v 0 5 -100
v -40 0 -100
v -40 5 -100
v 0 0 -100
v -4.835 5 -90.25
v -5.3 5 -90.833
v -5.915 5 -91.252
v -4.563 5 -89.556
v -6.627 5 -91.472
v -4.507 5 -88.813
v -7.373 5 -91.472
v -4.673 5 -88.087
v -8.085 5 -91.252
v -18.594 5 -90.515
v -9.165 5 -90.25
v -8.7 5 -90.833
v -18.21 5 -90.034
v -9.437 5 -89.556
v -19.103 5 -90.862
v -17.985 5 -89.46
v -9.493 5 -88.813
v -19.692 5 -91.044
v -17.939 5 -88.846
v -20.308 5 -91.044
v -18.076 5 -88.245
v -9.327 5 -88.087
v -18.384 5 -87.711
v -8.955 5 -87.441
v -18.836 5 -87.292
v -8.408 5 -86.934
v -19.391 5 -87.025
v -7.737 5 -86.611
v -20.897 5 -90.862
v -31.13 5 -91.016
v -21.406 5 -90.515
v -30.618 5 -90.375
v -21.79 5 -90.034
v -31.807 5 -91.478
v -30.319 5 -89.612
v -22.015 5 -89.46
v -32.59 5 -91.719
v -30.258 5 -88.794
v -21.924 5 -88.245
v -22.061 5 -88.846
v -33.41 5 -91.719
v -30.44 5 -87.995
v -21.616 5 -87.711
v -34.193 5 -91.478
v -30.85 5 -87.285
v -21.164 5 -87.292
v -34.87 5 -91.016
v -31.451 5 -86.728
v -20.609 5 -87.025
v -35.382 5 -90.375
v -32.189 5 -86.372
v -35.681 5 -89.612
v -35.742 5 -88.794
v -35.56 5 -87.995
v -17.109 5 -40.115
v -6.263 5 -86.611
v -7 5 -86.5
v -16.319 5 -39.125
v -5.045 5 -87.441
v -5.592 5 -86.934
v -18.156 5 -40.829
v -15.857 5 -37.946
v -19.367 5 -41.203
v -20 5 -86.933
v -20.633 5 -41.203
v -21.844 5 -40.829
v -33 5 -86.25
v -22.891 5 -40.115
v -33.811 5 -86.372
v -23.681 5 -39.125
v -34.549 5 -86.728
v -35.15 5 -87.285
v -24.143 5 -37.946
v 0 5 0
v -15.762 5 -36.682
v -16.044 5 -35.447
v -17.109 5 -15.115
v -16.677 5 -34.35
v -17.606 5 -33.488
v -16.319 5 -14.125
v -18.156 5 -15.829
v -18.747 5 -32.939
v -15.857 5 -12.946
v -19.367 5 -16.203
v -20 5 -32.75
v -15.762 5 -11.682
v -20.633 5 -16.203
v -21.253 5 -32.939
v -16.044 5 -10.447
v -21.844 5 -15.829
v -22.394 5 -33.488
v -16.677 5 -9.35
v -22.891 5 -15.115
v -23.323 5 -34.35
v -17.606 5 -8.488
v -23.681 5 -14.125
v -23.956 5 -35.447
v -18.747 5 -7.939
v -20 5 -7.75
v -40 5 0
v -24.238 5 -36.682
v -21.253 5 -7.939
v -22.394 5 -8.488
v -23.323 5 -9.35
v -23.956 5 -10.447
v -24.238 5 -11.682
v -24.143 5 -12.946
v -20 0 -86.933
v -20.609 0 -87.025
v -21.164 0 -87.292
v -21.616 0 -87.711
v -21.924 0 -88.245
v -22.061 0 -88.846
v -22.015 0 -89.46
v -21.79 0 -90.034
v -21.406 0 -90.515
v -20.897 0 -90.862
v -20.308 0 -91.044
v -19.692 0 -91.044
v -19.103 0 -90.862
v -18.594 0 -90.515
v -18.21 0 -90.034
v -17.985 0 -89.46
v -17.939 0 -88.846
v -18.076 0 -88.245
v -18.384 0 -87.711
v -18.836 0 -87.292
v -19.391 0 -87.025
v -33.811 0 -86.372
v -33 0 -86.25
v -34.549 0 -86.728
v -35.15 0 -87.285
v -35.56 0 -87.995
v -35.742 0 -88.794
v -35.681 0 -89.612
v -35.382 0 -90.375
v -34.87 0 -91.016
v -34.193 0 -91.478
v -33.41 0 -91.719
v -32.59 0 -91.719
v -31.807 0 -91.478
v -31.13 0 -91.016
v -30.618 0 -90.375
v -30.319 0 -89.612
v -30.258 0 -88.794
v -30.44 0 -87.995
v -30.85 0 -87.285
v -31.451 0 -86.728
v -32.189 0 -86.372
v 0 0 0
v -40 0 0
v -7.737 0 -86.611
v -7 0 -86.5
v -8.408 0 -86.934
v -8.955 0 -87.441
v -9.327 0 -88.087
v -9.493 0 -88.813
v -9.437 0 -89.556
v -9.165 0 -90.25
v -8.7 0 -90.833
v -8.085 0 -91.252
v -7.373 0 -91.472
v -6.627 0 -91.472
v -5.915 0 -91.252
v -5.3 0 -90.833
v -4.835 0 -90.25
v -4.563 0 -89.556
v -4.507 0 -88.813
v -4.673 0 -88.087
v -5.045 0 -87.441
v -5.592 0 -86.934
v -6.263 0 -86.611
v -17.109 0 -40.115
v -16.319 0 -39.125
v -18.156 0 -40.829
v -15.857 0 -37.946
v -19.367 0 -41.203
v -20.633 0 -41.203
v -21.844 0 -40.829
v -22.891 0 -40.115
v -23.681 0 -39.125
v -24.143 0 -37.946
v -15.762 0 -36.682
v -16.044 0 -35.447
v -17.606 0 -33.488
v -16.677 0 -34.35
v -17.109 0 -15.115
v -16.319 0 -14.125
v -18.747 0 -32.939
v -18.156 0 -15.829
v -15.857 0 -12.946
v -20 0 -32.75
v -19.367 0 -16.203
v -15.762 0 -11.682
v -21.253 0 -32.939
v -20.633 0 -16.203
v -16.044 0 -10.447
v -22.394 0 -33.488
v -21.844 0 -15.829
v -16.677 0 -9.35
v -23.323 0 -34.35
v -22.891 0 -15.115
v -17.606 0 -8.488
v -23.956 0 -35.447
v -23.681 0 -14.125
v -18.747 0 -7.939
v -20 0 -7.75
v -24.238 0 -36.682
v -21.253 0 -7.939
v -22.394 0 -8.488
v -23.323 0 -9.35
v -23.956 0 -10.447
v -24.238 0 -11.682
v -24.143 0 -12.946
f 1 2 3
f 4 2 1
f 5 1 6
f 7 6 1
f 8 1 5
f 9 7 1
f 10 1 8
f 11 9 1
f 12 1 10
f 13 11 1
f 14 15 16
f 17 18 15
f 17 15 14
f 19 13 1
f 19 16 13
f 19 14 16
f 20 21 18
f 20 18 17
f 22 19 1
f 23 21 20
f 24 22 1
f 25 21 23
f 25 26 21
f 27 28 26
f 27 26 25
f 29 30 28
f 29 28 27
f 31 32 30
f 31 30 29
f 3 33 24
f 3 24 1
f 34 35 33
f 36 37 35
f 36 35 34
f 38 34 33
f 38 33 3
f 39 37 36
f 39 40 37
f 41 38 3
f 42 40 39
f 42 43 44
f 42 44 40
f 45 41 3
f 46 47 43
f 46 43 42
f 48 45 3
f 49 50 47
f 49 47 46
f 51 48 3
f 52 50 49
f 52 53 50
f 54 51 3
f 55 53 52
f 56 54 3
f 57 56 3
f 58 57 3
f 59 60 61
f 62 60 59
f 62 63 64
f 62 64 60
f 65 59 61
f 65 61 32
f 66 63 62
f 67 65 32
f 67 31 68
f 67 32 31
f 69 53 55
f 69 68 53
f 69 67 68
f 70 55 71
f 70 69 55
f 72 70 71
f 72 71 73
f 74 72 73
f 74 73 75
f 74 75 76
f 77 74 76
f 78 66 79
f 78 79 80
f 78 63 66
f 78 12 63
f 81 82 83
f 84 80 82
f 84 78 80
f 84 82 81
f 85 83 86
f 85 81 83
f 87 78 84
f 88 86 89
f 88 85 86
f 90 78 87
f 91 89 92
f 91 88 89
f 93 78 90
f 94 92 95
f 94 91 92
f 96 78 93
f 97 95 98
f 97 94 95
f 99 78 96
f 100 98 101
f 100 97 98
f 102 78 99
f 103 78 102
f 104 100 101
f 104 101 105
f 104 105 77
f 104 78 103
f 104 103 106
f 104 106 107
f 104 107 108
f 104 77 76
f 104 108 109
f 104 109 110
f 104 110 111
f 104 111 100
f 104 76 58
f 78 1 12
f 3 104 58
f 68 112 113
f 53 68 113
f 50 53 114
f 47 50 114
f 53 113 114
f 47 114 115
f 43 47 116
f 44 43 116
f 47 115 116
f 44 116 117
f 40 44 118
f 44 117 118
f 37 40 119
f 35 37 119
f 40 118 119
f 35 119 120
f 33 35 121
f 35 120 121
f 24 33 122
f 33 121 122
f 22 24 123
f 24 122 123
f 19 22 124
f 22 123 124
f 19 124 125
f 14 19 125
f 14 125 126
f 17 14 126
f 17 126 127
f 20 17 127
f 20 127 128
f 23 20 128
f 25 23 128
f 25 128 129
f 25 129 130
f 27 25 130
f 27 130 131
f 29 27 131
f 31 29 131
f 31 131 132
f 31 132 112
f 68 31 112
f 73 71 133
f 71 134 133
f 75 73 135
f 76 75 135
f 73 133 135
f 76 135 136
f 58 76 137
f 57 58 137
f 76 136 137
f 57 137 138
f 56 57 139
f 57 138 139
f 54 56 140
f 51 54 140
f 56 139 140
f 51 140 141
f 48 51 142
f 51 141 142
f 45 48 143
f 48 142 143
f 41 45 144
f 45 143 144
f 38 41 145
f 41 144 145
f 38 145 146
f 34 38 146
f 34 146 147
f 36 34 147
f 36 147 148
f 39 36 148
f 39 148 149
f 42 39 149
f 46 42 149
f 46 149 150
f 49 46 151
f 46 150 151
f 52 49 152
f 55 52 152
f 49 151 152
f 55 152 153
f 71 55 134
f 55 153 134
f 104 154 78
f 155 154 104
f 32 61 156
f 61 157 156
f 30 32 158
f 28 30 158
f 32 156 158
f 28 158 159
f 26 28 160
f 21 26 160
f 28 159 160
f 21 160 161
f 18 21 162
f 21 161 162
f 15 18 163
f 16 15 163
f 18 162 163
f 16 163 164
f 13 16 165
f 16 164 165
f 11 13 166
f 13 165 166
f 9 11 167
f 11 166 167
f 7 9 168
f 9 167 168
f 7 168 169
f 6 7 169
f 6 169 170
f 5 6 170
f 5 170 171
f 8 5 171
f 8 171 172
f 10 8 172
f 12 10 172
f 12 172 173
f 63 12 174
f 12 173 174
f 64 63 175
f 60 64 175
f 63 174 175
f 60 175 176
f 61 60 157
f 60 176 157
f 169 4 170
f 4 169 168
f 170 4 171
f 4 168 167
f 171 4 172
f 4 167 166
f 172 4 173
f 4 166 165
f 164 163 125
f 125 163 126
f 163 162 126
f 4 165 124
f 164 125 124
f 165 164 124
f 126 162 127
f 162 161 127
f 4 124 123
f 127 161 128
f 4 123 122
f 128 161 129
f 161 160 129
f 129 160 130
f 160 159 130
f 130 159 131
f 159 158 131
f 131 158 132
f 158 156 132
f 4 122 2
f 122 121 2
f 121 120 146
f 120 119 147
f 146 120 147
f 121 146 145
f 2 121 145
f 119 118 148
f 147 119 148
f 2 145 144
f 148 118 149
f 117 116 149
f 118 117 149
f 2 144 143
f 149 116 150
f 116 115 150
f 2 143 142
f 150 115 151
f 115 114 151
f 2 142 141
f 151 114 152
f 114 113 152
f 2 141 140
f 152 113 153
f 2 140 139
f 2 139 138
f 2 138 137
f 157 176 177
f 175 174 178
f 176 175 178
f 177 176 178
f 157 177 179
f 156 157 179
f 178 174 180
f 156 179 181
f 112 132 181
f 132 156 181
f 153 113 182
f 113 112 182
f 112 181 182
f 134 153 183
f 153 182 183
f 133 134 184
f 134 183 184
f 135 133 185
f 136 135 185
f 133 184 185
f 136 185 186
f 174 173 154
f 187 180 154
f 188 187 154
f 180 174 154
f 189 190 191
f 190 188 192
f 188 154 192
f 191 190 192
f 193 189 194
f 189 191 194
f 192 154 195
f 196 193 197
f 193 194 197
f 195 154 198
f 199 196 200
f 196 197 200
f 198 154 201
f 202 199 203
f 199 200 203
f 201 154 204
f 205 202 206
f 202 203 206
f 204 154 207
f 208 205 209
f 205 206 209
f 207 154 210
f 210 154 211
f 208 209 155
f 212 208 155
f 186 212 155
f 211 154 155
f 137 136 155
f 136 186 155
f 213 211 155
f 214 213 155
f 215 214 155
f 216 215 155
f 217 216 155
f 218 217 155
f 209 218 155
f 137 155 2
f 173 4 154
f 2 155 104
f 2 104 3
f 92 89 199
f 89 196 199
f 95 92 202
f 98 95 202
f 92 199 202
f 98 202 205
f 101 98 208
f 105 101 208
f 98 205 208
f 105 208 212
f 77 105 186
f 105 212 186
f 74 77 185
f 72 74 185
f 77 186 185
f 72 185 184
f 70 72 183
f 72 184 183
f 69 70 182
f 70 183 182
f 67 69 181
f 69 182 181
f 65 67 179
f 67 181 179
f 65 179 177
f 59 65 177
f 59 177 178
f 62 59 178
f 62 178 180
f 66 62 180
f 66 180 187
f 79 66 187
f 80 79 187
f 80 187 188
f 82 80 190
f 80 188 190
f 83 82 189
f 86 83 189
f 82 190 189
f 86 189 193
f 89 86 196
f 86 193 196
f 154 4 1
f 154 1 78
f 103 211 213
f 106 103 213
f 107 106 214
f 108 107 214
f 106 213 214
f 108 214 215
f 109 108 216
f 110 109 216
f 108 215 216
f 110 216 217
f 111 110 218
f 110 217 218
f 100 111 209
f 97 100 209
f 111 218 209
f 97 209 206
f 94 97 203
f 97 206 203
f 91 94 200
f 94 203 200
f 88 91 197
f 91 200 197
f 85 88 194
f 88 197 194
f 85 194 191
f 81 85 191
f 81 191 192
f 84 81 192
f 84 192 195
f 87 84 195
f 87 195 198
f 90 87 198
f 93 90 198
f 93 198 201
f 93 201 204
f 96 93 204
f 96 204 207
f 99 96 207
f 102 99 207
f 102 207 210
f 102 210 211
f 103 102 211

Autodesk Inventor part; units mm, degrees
ref_plane "YZ Plane" through (0, 0, 0) normal (1, 0, 0) x (0, 1, 0)
ref_plane "XZ Plane" through (0, 0, 0) normal (0, 1, 0) x (-1, 0, 0)
ref_plane "XY Plane" through (0, 0, 0) normal (0, 0, 1) x (1, 0, 0)
sketch "Sketch1" plane through (0, 0, 0) normal (0, 1, 0) x (-1, 0, 0)
  line L0 (0, 0) -> (40, 0)
  line L1 (40, 0) -> (40, -100)
  line L2 (40, -100) -> (0, -100)
  line L3 (0, -100) -> (0, 0)
  dimension "d0" = 100
  dimension "d1" = 40
extrude "Extrusion1" add sketch "Sketch1" along normal blind 5
sketch "Sketch2" plane through (0, 5, 0) normal (0, 1, 0) x (1, 0, 0)
  line L0 (-40, 100) -> (-40, 0) projected
  line L1 (-40, 89) -> (0, 89) construction
  line L2 (0, 0) -> (0, 100) projected
  line L3 (0, 100) -> (-40, 100) projected
  point P0 (-33, 89)
  point P1 (-20, 89)
  point P2 (-7, 89)
  dimension "d4" = 7
  dimension "d5" = 7
  dimension "d6" = 13
  dimension "d7" = 13
  dimension "d8" = 11
hole "Hole1" at (-33, 5, -89) direction (0, -1, 0) diameter 5.5 end through all
hole "Hole2" at (-20, 5, -89) direction (0, -1, 0) diameter 4.134 end through all thread size "M5x0.8" class "6H" standard "ISO Metric profile"
sketch "Sketch3" plane through (0, 5, 0) normal (0, 1, 0) x (1, 0, 0)
  line L0 (0, 0) -> (0, 100) projected
  line L1 (-40, 0) -> (0, 0) projected
  point P0 (-20, 12)
  point P1 (-20, 37)
  dimension "d23" = 20
  dimension "d24" = 20
  dimension "d25" = 25
  dimension "d26" = 12
hole "Hole3" at (-20, 5, -12) at (-20, 5, -37) direction (0, -1, 0) diameter 8.5 end through all
hole "Hole4" at (-7, 5, -89) direction (0, -1, 0) diameter 5 end through all
equation "\"d4\" = d5"
equation "\"d6\" = d7"
equation "\"d24\" = d23"
properties part number "ER_Verbindungsplatte_Verschraubeinheit"
